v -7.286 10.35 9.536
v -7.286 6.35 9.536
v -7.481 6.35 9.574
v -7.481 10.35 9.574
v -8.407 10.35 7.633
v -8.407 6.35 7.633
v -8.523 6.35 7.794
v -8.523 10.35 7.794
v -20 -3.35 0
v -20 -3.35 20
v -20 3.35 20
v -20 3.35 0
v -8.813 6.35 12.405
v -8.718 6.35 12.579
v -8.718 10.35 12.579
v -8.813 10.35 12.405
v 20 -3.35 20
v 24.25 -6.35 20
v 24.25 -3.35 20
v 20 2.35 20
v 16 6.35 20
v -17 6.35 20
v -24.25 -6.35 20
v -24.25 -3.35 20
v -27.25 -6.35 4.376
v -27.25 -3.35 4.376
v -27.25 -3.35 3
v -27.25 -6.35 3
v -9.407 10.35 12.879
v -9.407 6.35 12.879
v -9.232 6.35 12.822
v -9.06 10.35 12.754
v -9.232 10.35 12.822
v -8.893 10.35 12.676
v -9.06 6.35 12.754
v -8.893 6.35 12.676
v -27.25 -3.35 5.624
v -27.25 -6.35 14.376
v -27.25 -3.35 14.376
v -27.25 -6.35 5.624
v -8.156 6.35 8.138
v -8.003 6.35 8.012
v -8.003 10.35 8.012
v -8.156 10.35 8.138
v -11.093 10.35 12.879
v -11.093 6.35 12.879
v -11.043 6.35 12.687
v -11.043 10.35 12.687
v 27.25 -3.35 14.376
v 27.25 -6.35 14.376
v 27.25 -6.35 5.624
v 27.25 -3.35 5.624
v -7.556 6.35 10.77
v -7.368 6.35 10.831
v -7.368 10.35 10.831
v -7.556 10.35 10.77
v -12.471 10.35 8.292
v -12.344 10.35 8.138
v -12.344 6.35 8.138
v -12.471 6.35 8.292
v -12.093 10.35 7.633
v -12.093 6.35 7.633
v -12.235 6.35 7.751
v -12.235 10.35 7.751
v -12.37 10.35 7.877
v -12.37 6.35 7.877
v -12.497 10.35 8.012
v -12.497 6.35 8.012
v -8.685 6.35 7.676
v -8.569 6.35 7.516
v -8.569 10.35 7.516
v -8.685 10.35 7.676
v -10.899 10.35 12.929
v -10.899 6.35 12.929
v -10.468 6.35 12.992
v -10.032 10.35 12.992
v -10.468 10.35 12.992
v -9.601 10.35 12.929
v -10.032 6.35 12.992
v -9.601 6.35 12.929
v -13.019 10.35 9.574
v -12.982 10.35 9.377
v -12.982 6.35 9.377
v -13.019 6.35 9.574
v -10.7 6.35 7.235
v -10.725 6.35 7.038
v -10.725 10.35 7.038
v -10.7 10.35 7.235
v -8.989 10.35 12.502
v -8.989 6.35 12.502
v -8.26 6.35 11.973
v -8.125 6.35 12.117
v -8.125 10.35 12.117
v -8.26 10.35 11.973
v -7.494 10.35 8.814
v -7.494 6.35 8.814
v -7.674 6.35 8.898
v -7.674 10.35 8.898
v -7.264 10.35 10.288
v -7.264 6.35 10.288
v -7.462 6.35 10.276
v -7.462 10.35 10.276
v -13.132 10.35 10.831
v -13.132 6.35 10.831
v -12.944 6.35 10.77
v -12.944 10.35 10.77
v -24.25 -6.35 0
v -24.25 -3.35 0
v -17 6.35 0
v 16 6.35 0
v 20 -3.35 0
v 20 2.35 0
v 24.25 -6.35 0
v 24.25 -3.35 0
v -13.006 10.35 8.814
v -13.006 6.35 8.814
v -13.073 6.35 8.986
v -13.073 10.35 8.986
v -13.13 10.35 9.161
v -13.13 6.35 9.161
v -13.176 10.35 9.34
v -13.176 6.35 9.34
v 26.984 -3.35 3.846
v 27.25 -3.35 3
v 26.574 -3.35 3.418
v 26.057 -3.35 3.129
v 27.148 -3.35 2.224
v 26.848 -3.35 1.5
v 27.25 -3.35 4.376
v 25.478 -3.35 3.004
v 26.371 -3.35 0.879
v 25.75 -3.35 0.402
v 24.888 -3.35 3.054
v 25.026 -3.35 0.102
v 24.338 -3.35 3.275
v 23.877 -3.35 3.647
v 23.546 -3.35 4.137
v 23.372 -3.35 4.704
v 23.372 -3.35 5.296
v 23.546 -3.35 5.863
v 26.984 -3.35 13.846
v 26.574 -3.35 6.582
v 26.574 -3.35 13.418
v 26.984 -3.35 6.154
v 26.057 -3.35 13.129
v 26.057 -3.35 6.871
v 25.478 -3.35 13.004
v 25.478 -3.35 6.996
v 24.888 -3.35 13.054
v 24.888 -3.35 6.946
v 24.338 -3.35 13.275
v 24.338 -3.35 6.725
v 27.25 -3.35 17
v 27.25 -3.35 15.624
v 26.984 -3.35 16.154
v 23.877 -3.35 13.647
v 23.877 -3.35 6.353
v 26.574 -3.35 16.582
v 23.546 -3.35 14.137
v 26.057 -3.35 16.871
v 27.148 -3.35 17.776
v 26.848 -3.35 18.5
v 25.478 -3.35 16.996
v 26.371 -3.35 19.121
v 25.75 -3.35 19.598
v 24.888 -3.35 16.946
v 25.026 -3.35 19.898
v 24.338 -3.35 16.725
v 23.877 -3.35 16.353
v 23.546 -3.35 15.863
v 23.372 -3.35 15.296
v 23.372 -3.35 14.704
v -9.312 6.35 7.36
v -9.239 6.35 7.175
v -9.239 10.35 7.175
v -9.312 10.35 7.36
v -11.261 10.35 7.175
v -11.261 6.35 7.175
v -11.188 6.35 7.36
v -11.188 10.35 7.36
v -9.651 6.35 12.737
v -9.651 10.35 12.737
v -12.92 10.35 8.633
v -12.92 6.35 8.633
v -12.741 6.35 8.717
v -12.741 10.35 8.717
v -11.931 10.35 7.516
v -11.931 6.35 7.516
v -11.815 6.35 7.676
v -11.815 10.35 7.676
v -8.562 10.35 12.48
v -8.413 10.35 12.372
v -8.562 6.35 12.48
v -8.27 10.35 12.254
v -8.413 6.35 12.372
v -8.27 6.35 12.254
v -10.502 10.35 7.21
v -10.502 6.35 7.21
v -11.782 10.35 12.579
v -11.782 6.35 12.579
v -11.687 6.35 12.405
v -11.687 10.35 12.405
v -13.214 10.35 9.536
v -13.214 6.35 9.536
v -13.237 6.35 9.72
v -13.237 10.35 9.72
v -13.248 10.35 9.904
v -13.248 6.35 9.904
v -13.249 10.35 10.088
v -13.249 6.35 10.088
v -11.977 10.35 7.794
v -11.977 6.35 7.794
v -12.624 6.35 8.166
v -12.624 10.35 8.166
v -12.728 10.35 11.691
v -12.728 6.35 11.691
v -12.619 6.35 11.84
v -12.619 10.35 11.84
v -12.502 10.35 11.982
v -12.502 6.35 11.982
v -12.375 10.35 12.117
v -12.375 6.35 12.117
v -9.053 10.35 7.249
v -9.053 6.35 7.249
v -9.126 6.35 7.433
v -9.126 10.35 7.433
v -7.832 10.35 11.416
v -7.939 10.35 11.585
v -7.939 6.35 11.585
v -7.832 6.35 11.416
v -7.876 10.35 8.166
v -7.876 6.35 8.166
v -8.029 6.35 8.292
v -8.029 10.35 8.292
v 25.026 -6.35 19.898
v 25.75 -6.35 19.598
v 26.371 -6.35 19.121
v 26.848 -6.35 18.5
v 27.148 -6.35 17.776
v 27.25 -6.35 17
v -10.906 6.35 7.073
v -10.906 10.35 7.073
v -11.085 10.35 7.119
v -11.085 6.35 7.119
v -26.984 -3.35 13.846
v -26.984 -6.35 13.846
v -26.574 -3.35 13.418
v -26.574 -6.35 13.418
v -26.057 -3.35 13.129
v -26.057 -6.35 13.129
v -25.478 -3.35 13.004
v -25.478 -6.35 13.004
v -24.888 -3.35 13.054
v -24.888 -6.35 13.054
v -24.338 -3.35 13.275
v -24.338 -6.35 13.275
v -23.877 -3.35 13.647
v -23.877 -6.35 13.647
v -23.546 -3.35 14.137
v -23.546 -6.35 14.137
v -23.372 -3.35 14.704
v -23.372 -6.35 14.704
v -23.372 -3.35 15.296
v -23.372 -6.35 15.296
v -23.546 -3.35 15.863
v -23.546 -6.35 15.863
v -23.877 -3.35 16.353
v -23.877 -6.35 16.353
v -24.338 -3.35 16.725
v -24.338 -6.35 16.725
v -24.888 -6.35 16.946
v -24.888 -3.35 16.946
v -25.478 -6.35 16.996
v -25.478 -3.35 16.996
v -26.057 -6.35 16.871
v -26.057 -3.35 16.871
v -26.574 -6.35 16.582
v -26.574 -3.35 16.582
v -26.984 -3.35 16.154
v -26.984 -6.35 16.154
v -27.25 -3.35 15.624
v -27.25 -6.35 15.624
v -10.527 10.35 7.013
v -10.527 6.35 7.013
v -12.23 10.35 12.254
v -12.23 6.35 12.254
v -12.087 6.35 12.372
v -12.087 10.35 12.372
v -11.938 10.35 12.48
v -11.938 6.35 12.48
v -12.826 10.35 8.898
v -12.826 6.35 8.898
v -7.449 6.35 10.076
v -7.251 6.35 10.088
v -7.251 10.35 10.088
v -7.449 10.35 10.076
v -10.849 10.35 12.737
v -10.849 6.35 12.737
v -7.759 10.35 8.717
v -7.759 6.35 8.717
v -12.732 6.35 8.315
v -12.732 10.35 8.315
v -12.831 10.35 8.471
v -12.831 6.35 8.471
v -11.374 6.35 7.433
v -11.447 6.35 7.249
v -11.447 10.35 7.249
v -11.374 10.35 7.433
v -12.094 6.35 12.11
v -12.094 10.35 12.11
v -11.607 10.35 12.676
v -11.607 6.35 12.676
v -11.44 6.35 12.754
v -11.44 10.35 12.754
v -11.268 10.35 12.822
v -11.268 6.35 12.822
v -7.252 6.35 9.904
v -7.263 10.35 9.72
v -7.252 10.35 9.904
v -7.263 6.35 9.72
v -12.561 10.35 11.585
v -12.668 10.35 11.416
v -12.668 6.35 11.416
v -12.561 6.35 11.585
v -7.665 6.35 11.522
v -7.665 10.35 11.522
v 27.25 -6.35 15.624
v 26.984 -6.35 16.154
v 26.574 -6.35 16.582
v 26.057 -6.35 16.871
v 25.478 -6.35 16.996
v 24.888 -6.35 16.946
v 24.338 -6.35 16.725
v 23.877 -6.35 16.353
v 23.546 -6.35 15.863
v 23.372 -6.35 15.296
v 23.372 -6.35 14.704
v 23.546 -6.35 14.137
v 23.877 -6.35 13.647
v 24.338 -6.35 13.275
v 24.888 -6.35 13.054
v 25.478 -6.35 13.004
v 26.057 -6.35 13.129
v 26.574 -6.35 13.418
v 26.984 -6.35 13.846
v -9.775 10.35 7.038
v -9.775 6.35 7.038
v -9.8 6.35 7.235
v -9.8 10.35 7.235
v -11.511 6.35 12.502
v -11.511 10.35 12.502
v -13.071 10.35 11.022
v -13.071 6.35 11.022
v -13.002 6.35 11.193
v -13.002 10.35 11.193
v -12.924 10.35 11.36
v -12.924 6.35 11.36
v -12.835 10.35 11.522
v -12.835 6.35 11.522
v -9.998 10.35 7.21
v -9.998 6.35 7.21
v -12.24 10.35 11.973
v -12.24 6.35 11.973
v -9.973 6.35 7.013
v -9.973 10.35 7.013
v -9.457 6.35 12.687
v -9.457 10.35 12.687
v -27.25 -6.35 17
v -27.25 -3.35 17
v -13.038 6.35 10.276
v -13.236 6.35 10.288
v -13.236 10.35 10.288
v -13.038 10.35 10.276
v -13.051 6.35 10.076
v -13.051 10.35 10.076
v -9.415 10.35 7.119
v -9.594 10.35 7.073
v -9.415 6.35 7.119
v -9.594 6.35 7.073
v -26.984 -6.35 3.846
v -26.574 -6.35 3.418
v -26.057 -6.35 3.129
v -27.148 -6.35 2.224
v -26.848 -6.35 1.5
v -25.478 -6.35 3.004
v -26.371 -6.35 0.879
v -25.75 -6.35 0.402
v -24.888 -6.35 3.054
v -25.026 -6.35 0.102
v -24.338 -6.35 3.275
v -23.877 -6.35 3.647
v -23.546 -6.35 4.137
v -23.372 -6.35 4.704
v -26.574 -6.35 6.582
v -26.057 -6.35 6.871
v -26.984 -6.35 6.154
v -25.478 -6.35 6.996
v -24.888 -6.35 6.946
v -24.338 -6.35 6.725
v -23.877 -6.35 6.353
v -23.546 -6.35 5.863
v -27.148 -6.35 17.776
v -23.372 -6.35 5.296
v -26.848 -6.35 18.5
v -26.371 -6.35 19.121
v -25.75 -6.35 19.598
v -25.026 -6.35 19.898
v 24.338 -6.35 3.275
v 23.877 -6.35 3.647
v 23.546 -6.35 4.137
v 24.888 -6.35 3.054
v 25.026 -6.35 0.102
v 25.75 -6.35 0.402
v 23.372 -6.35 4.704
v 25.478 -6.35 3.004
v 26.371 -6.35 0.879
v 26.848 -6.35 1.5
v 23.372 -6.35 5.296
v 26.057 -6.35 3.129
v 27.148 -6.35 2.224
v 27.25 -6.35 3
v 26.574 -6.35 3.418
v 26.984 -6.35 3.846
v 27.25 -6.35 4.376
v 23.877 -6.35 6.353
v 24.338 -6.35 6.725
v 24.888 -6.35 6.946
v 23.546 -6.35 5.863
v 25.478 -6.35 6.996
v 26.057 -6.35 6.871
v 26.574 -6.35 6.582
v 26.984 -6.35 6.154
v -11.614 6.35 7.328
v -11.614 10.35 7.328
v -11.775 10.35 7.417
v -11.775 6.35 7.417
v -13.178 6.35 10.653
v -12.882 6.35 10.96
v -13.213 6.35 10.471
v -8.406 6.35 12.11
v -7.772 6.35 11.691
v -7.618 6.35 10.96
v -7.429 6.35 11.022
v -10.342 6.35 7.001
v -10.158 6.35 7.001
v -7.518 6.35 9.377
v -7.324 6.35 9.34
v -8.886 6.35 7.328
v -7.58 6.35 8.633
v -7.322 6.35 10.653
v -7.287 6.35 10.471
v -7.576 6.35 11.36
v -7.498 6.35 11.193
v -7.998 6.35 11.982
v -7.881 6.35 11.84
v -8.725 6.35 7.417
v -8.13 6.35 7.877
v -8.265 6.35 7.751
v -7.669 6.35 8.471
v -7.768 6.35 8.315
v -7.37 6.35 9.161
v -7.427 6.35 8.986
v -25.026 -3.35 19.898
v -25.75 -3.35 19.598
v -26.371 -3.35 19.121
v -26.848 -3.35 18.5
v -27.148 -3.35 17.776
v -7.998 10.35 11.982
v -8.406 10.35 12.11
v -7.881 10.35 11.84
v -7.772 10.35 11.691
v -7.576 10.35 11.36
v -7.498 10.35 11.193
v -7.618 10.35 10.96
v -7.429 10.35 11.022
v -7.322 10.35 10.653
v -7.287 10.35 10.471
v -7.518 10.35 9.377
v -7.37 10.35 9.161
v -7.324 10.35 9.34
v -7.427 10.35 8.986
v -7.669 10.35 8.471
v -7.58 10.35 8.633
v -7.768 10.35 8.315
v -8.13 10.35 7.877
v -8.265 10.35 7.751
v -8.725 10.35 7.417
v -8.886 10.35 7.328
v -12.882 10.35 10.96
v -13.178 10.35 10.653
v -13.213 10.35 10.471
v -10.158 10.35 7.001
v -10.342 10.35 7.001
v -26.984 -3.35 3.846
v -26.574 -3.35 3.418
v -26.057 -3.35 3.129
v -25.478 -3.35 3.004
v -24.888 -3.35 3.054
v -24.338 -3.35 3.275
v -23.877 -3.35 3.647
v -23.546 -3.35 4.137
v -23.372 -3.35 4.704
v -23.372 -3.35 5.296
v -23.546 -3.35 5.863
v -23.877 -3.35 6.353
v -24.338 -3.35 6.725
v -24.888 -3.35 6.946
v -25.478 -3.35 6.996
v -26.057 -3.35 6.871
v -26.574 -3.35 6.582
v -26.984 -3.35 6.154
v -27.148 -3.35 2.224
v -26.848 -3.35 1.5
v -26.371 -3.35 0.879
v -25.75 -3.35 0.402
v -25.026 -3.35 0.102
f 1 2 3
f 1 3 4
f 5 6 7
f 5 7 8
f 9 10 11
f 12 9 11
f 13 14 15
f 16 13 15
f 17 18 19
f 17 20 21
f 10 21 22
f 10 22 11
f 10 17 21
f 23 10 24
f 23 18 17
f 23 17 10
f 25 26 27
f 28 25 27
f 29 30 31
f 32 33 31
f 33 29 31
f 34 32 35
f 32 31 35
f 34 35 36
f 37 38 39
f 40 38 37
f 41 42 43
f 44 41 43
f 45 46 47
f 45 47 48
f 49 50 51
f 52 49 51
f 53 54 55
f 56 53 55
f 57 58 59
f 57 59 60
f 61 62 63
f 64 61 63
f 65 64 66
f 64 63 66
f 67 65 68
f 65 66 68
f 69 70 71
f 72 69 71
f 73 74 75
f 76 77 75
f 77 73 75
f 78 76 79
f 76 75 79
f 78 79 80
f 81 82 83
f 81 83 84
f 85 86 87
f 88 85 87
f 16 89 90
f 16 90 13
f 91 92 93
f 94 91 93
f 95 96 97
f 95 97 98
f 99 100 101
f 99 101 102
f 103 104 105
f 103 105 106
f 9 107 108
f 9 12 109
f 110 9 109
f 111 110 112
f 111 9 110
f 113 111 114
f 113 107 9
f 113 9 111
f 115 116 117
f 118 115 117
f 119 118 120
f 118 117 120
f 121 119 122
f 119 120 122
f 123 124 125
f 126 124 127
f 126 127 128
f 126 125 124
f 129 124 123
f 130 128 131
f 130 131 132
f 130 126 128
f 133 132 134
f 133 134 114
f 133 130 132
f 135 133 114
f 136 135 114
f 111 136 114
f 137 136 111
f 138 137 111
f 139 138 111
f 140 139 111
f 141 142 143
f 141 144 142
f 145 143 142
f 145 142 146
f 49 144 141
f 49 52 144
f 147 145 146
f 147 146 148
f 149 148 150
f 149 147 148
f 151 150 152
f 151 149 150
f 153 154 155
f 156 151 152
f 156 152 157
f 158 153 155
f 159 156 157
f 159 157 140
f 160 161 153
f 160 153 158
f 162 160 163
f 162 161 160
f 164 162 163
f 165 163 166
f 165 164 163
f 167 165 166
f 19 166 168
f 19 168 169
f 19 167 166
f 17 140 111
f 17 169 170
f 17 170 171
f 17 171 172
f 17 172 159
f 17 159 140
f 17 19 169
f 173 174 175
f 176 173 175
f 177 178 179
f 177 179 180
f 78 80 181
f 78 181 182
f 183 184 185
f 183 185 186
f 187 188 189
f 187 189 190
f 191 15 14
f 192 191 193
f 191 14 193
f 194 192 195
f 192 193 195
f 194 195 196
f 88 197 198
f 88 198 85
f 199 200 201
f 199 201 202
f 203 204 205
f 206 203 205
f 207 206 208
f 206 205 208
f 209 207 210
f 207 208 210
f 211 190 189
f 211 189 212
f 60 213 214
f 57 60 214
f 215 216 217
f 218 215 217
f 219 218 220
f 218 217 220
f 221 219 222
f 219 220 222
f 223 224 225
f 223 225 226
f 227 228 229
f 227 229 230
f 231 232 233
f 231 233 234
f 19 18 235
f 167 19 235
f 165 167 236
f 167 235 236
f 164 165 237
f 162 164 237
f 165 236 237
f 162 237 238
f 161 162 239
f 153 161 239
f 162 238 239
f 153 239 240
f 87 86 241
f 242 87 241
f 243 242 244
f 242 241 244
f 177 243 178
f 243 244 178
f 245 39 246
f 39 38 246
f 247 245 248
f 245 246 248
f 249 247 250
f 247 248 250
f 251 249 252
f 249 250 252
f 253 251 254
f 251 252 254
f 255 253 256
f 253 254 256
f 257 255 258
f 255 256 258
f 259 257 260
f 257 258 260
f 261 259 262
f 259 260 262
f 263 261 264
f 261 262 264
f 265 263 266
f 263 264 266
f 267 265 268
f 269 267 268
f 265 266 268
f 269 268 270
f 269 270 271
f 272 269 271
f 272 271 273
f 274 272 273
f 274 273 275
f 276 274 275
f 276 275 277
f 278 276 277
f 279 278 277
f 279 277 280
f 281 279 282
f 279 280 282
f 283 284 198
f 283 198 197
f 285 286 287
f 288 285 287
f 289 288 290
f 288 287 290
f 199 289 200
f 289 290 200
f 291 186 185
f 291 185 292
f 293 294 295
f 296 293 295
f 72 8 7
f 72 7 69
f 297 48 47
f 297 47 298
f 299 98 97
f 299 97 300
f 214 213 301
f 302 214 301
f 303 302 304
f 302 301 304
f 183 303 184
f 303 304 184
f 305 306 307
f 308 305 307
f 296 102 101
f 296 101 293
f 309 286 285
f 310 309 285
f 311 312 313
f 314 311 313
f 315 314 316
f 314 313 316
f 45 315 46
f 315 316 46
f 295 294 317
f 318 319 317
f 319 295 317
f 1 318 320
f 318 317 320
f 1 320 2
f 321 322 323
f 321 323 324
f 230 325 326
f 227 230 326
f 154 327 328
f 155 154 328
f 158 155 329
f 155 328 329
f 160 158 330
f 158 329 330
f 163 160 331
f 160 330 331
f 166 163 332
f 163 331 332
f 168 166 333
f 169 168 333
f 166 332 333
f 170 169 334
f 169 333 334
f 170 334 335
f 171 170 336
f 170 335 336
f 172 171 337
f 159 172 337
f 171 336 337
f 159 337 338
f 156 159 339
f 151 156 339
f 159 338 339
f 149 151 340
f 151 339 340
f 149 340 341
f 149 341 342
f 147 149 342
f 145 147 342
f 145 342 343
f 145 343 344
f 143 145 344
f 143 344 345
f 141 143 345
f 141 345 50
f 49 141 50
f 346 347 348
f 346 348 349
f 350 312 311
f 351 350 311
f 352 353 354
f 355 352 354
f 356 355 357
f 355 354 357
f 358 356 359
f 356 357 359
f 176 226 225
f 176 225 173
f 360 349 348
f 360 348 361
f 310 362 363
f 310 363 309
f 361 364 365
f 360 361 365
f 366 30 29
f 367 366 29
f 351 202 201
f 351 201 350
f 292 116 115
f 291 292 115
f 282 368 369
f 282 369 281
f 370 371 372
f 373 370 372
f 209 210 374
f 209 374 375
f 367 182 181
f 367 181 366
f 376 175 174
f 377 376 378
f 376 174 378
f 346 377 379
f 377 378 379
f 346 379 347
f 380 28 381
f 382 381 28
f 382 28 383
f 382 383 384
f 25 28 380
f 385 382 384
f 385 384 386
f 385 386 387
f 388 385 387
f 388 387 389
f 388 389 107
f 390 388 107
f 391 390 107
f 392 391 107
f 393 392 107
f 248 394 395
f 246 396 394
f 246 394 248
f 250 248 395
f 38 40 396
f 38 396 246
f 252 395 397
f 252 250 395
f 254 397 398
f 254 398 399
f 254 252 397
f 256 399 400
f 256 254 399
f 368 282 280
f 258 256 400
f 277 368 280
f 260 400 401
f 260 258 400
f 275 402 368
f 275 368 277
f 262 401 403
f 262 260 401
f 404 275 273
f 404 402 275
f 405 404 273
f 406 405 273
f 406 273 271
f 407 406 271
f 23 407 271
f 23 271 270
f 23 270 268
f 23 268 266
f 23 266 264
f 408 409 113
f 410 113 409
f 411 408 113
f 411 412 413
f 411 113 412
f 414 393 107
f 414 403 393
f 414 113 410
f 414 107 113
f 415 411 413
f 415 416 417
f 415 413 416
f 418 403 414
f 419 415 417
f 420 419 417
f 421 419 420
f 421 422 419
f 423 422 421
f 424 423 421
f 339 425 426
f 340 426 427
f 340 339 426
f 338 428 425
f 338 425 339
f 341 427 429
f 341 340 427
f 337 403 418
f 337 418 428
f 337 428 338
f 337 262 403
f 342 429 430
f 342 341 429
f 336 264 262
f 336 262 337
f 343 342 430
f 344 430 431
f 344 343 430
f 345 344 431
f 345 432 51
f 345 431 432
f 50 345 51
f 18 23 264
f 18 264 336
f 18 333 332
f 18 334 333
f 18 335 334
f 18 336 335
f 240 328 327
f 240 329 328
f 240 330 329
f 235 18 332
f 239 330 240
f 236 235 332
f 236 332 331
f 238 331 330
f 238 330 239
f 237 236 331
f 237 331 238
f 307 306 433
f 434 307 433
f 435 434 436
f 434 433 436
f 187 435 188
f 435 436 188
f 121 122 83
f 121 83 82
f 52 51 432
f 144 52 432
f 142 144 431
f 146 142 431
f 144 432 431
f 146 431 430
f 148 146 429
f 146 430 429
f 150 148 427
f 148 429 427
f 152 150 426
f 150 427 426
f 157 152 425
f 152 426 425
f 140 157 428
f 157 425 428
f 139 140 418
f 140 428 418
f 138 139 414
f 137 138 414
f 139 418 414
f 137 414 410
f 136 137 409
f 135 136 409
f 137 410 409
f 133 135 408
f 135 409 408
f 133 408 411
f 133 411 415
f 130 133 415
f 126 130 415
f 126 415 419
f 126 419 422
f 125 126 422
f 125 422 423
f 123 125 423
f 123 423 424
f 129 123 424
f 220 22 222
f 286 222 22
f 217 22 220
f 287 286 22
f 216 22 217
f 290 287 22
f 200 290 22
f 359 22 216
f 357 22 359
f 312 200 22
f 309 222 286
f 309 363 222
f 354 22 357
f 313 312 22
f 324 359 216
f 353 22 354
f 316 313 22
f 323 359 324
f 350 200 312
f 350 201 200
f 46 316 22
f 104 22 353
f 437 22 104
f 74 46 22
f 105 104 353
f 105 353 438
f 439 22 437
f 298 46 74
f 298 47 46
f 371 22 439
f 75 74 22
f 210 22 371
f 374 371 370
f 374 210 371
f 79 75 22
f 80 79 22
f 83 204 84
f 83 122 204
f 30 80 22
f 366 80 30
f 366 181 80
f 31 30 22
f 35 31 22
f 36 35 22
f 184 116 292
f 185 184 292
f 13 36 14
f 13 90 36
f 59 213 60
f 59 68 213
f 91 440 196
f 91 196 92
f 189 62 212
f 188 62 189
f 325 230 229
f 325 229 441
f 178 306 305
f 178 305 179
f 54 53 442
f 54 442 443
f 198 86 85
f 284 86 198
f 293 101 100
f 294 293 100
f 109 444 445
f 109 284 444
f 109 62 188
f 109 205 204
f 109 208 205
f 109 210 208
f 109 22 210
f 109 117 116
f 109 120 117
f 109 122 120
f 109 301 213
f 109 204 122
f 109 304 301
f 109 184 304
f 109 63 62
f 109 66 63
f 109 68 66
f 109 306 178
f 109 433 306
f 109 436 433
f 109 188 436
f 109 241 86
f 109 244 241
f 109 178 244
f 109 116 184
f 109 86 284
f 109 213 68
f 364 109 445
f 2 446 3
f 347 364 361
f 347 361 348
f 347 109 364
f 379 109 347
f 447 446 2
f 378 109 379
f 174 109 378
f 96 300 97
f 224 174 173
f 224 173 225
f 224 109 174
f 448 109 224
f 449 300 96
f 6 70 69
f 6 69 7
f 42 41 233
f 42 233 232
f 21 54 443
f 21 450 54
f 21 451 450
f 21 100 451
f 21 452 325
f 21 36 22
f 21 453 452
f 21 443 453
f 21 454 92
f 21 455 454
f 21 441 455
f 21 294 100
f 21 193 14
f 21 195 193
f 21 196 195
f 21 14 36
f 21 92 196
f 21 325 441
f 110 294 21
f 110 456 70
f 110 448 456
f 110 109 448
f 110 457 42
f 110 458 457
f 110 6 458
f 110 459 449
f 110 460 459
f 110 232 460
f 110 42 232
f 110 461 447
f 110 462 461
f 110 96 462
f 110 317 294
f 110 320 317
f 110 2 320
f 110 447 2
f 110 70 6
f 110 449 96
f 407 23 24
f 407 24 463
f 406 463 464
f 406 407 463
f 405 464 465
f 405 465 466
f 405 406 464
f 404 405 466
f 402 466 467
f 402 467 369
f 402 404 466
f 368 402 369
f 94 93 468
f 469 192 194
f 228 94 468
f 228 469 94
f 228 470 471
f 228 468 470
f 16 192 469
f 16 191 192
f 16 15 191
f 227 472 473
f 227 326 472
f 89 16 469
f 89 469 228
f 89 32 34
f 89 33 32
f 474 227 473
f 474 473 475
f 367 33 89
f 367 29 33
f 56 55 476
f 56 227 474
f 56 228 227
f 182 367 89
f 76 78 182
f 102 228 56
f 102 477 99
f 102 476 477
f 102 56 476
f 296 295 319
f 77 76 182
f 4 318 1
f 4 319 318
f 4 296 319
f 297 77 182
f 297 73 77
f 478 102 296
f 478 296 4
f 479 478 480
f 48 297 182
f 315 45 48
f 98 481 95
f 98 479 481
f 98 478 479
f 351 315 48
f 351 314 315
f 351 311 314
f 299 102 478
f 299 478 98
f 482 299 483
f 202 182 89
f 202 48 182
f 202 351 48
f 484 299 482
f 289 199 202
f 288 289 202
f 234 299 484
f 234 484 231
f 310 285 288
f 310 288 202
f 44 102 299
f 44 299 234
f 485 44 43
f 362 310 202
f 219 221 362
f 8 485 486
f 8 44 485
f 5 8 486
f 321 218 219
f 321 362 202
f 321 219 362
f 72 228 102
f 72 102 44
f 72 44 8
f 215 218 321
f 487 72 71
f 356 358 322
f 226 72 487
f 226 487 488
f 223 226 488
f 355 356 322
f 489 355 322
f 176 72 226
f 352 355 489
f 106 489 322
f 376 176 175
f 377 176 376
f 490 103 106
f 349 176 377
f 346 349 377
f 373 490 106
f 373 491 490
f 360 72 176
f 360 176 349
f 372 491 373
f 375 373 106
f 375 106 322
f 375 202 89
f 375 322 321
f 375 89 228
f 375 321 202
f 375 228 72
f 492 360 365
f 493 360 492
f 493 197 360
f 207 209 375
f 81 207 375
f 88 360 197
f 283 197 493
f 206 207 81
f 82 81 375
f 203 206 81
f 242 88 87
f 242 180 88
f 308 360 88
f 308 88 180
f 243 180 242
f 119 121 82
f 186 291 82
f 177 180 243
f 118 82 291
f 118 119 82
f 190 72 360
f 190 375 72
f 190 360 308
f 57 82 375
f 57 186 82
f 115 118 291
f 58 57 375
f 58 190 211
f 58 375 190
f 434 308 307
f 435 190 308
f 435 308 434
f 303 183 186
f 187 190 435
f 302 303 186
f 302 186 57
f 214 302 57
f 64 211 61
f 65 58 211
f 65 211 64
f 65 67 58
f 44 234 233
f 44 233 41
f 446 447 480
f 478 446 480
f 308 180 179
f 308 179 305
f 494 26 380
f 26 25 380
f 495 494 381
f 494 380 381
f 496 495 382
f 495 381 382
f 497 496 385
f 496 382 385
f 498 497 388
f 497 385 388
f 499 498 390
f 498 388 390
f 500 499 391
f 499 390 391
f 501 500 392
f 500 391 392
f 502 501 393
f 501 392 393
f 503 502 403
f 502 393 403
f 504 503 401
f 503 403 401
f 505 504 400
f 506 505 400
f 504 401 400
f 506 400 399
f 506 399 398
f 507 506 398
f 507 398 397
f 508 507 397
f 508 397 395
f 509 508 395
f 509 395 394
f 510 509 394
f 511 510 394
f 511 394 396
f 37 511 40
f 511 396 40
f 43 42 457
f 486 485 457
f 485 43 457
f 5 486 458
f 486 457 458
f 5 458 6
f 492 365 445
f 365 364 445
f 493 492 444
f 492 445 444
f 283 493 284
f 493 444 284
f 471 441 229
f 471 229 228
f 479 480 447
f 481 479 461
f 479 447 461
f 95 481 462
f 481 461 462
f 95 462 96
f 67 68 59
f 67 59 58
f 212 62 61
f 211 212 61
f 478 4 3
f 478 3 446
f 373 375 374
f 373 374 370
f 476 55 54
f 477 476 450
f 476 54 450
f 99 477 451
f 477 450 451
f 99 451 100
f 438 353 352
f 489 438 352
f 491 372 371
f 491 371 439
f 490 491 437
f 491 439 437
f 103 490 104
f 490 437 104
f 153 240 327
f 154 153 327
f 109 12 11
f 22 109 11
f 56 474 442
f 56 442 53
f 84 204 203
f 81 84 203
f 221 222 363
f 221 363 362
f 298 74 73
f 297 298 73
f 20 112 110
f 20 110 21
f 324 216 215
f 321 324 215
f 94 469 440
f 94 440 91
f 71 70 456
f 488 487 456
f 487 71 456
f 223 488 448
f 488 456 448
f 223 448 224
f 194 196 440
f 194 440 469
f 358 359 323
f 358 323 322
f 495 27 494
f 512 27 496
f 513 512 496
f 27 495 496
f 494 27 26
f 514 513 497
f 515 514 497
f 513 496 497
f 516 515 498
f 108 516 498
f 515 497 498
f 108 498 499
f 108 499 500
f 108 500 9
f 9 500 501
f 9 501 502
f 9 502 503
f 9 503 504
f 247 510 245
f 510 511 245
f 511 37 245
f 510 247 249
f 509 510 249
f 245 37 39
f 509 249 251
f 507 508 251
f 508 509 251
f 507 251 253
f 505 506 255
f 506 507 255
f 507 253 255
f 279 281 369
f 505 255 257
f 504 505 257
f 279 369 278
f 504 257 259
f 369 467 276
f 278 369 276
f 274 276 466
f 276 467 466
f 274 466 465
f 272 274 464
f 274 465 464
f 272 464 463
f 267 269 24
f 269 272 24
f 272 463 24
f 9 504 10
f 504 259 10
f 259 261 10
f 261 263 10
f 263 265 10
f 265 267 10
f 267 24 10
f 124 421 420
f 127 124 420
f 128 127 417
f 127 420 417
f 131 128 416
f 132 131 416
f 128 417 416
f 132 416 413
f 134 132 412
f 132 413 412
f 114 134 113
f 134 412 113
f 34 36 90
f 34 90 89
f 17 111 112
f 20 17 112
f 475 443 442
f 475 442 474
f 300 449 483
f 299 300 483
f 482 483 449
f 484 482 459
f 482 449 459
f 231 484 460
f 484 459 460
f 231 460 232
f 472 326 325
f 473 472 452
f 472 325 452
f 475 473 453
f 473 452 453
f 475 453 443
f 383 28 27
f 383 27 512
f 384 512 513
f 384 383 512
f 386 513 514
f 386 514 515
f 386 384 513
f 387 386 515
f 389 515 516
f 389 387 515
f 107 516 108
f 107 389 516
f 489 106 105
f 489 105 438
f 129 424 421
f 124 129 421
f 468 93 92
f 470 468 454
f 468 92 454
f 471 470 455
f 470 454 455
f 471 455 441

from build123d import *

# Parameters (mm, degrees)
SKETCH_1_W               = 40
SKETCH_1_H               = 12.7
EXTRUDE_1_DEPTH          = 20
EXTRUDE_4_DEPTH          = 3
SKETCH_4_R               = 2
CUT_EXTRUDE_1_DEPTH      = 3
CHAMFER_2_SIZE           = 4
CHAMFER_3_SIZE           = 3
SKETCH_5_R               = 3
EXTRUDE_5_DEPTH          = 4
SKETCH_6_W               = 0.2
SKETCH_6_H               = 4
CUT_EXTRUDE_2_DEPTH      = 0.2
PATTERN_CIRCULAR_1_COUNT = 25


with BuildPart() as part:
    # 草图1 → 凸台-拉伸1 (new body)
    with BuildSketch(Plane.XY):
        Rectangle(SKETCH_1_W, SKETCH_1_H)
    extrude(amount=EXTRUDE_1_DEPTH)

    # 草图3 → 凸台-拉伸4 (add)
    with BuildSketch(Plane.XZ.offset(6.35)):
        with BuildLine():
            Line((-20, 20), (-24.25, 20))
            ThreePointArc((-24.25, 20), (-26.371320344, 19.121320344), (-27.25, 17))
            Line((-27.25, 17), (-27.25, 3))
            ThreePointArc((-27.25, 3), (-26.371320344, 0.878679656), (-24.25, 0))
            Line((-24.25, 0), (-20, 0))
            Line((-20, 0), (-20, 20))
        make_face()
        with BuildLine():
            Line((20, 20), (24.25, 20))
            ThreePointArc((24.25, 20), (26.371320344, 19.121320344), (27.25, 17))
            Line((27.25, 17), (27.25, 3))
            ThreePointArc((27.25, 3), (26.371320344, 0.878679656), (24.25, 0))
            Line((24.25, 0), (20, 0))
            Line((20, 0), (20, 20))
        make_face()
    extrude(amount=-EXTRUDE_4_DEPTH)

    # 草图4 → 切除-拉伸1 (cut)
    with BuildSketch(Plane.XZ.offset(6.35)):
        with Locations((-25.35, 15)):
            Circle(SKETCH_4_R)
        with Locations((-25.35, 5)):
            Circle(SKETCH_4_R)
        with Locations((25.35, 15)):
            Circle(SKETCH_4_R)
        with Locations((25.35, 5)):
            Circle(SKETCH_4_R)
    extrude(amount=-CUT_EXTRUDE_1_DEPTH, mode=Mode.SUBTRACT)

    # 倒角2
    chamfer_2_edges = [part.edges().sort_by_distance(p)[0] for p in [
        (20, 6.35, 10),
    ]]
    chamfer(chamfer_2_edges, length=CHAMFER_2_SIZE)

    # 倒角3
    chamfer_3_edges = [part.edges().sort_by_distance(p)[0] for p in [
        (-20, 6.35, 10),
    ]]
    chamfer(chamfer_3_edges, length=CHAMFER_3_SIZE)

    # 草图5 → 凸台-拉伸5 (add)
    with BuildSketch(Plane(origin=(0, 6.35, 0), x_dir=(1, 0, 0), z_dir=(0, 1, 0))):
        with Locations(Location((-10.25, -10, 0), (0, 0, 90))):
            Circle(SKETCH_5_R)
    extrude_5 = extrude(amount=EXTRUDE_5_DEPTH)

    # 草图6 → 切除-拉伸2 (cut)
    with BuildSketch(Plane.XY.offset(13)):
        with Locations((-10.25, 8.35)):
            Rectangle(SKETCH_6_W, SKETCH_6_H)
    cut_extrude_2 = extrude(amount=-CUT_EXTRUDE_2_DEPTH, mode=Mode.SUBTRACT)

    # 阵列(圆周)1: 凸台-拉伸5, 切除-拉伸2 ×25 about axis
    pattern_circular_1_axis = Axis((-10.25, 10.35, 10), (0, -1, 0))
    add([extrude_5.rotate(pattern_circular_1_axis, i * 360 / PATTERN_CIRCULAR_1_COUNT) for i in range(1, PATTERN_CIRCULAR_1_COUNT)])
    add([cut_extrude_2.rotate(pattern_circular_1_axis, i * 360 / PATTERN_CIRCULAR_1_COUNT) for i in range(1, PATTERN_CIRCULAR_1_COUNT)], mode=Mode.SUBTRACT)


solid = part.part
